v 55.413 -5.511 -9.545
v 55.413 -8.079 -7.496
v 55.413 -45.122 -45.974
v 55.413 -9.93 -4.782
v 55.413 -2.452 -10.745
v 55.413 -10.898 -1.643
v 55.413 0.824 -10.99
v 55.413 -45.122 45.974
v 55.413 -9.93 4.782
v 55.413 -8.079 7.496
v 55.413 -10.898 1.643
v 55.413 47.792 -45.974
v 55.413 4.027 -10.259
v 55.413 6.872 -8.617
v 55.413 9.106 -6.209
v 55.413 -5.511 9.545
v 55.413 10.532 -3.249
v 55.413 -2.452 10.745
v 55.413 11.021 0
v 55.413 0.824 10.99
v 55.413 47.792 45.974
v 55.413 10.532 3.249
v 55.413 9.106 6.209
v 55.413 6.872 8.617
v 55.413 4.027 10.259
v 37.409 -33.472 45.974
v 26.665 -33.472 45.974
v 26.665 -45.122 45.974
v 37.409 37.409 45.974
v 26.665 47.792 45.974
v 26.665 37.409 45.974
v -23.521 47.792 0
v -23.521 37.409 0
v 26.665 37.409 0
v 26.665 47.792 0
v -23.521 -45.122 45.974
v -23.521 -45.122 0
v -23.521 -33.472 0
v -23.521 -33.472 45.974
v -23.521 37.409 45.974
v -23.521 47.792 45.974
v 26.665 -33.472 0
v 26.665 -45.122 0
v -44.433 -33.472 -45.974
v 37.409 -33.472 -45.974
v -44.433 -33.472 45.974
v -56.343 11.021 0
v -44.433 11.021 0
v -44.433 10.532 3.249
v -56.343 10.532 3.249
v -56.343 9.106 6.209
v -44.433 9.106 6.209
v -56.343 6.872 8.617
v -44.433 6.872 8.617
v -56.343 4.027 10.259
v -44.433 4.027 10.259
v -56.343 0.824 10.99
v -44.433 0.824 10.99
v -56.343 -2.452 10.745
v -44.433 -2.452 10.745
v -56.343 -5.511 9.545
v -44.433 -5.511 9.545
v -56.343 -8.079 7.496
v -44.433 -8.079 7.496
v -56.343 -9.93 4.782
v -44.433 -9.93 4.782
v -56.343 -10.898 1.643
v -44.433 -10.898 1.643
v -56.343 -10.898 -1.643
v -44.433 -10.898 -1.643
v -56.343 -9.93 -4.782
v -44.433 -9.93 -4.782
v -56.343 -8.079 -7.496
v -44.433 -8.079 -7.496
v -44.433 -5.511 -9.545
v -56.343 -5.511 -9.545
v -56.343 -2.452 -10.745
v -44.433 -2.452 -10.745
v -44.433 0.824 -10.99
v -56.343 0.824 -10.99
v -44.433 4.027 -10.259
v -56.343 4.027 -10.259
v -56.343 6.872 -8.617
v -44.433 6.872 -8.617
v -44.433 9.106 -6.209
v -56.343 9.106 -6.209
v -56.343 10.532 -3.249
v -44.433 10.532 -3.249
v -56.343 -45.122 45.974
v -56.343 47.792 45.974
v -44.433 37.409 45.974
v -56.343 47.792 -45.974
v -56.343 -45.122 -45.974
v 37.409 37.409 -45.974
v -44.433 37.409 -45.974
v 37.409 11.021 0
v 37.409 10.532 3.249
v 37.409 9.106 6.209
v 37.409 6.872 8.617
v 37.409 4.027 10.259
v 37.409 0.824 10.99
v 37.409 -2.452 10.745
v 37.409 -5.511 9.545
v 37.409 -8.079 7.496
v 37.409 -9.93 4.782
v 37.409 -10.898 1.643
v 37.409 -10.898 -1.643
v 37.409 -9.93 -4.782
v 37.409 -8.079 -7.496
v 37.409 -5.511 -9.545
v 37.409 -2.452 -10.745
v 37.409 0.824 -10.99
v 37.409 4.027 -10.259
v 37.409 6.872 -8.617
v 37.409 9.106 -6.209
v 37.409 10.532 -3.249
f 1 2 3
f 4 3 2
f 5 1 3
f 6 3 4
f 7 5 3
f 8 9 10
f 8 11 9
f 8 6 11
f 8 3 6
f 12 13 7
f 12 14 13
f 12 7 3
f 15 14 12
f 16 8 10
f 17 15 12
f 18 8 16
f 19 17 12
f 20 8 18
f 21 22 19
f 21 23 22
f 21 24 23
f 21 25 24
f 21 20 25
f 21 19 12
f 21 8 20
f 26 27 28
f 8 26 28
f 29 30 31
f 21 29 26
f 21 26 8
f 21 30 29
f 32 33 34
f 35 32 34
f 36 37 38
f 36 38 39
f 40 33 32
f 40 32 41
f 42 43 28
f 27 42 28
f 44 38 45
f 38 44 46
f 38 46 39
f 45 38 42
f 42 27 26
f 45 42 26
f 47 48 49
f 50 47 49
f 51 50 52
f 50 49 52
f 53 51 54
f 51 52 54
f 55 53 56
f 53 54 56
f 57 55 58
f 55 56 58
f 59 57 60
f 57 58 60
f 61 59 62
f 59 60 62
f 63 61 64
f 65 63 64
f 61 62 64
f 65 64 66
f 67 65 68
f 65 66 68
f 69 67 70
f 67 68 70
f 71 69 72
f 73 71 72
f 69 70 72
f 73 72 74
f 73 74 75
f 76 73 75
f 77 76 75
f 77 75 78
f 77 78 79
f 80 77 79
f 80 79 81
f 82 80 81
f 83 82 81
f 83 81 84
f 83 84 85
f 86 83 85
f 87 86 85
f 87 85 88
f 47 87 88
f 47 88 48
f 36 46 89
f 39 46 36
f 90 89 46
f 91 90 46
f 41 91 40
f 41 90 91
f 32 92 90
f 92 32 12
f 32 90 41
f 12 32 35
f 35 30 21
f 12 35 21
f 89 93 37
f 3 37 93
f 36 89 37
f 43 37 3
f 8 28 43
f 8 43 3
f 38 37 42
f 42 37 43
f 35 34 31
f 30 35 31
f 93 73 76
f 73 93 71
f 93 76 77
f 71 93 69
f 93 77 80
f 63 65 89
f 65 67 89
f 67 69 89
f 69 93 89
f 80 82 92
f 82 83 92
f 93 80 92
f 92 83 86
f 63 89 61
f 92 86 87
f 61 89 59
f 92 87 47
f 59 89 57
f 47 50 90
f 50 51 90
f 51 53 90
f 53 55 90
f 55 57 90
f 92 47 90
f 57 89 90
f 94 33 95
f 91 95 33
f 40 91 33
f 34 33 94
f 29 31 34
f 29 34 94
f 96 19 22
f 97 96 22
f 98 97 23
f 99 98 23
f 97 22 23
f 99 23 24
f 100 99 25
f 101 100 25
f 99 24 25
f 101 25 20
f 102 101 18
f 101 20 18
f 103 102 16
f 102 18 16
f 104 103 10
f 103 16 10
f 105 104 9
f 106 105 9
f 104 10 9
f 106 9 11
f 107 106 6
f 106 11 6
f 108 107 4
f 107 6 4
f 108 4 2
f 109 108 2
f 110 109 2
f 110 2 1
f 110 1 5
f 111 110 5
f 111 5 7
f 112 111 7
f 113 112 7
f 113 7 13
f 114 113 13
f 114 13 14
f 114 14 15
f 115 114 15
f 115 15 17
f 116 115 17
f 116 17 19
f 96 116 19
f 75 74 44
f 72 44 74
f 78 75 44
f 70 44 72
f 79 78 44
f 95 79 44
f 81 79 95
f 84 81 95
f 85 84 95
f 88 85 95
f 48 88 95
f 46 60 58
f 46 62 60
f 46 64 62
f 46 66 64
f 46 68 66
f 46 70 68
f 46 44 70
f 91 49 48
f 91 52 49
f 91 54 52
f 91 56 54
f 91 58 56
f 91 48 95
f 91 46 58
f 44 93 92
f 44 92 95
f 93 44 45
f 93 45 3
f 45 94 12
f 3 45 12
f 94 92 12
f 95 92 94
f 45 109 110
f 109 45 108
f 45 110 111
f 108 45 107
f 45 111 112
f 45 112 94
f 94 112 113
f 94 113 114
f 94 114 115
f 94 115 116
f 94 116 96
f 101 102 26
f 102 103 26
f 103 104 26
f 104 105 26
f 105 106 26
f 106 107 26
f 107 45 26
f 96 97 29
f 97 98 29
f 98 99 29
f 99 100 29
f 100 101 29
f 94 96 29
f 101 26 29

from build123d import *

# Parameters (mm, degrees)
F0_W     = 111.7562593253
F0_H     = 92.9139485481
F1_DEPTH = 45.974
F2_W     = 81.8422921002
F2_H     = 70.8807926811
F3_DEPTH = 109.728
F4_R     = 11.0212748346
F5_DEPTH = 176.022
F6_W     = 50.1861777157
F6_H     = 45.974
F7_DEPTH = 118.364


with BuildPart() as f1:
    # F0 (on Top) → F1 (new body, symmetric)
    with BuildSketch(Plane.XY):
        with Locations((-0.4647924884, 1.3352592527)):
            Rectangle(F0_W, F0_H)
    extrude(amount=F1_DEPTH, both=True)

    # F2 (on face) → F3 (cut, symmetric)
    with BuildSketch(Plane.XY.offset(45.974)):
        with Locations((-3.5118889064, 1.9688608032)):
            Rectangle(F2_W, F2_H)
    extrude(amount=F3_DEPTH, both=True, mode=Mode.SUBTRACT)

    # F4 (on face) → F5 (cut)
    with BuildSketch(Plane.YZ.offset(55.4133371742)):
        Circle(F4_R)
    extrude(amount=-F5_DEPTH, mode=Mode.SUBTRACT)

    # F6 (on face) → F7 (cut)
    with BuildSketch(Plane.XZ.offset(45.1217150214)):
        with Locations((1.5720045194, 22.987)):
            Rectangle(F6_W, F6_H)
    extrude(amount=-F7_DEPTH, mode=Mode.SUBTRACT)


solid = f1.part
